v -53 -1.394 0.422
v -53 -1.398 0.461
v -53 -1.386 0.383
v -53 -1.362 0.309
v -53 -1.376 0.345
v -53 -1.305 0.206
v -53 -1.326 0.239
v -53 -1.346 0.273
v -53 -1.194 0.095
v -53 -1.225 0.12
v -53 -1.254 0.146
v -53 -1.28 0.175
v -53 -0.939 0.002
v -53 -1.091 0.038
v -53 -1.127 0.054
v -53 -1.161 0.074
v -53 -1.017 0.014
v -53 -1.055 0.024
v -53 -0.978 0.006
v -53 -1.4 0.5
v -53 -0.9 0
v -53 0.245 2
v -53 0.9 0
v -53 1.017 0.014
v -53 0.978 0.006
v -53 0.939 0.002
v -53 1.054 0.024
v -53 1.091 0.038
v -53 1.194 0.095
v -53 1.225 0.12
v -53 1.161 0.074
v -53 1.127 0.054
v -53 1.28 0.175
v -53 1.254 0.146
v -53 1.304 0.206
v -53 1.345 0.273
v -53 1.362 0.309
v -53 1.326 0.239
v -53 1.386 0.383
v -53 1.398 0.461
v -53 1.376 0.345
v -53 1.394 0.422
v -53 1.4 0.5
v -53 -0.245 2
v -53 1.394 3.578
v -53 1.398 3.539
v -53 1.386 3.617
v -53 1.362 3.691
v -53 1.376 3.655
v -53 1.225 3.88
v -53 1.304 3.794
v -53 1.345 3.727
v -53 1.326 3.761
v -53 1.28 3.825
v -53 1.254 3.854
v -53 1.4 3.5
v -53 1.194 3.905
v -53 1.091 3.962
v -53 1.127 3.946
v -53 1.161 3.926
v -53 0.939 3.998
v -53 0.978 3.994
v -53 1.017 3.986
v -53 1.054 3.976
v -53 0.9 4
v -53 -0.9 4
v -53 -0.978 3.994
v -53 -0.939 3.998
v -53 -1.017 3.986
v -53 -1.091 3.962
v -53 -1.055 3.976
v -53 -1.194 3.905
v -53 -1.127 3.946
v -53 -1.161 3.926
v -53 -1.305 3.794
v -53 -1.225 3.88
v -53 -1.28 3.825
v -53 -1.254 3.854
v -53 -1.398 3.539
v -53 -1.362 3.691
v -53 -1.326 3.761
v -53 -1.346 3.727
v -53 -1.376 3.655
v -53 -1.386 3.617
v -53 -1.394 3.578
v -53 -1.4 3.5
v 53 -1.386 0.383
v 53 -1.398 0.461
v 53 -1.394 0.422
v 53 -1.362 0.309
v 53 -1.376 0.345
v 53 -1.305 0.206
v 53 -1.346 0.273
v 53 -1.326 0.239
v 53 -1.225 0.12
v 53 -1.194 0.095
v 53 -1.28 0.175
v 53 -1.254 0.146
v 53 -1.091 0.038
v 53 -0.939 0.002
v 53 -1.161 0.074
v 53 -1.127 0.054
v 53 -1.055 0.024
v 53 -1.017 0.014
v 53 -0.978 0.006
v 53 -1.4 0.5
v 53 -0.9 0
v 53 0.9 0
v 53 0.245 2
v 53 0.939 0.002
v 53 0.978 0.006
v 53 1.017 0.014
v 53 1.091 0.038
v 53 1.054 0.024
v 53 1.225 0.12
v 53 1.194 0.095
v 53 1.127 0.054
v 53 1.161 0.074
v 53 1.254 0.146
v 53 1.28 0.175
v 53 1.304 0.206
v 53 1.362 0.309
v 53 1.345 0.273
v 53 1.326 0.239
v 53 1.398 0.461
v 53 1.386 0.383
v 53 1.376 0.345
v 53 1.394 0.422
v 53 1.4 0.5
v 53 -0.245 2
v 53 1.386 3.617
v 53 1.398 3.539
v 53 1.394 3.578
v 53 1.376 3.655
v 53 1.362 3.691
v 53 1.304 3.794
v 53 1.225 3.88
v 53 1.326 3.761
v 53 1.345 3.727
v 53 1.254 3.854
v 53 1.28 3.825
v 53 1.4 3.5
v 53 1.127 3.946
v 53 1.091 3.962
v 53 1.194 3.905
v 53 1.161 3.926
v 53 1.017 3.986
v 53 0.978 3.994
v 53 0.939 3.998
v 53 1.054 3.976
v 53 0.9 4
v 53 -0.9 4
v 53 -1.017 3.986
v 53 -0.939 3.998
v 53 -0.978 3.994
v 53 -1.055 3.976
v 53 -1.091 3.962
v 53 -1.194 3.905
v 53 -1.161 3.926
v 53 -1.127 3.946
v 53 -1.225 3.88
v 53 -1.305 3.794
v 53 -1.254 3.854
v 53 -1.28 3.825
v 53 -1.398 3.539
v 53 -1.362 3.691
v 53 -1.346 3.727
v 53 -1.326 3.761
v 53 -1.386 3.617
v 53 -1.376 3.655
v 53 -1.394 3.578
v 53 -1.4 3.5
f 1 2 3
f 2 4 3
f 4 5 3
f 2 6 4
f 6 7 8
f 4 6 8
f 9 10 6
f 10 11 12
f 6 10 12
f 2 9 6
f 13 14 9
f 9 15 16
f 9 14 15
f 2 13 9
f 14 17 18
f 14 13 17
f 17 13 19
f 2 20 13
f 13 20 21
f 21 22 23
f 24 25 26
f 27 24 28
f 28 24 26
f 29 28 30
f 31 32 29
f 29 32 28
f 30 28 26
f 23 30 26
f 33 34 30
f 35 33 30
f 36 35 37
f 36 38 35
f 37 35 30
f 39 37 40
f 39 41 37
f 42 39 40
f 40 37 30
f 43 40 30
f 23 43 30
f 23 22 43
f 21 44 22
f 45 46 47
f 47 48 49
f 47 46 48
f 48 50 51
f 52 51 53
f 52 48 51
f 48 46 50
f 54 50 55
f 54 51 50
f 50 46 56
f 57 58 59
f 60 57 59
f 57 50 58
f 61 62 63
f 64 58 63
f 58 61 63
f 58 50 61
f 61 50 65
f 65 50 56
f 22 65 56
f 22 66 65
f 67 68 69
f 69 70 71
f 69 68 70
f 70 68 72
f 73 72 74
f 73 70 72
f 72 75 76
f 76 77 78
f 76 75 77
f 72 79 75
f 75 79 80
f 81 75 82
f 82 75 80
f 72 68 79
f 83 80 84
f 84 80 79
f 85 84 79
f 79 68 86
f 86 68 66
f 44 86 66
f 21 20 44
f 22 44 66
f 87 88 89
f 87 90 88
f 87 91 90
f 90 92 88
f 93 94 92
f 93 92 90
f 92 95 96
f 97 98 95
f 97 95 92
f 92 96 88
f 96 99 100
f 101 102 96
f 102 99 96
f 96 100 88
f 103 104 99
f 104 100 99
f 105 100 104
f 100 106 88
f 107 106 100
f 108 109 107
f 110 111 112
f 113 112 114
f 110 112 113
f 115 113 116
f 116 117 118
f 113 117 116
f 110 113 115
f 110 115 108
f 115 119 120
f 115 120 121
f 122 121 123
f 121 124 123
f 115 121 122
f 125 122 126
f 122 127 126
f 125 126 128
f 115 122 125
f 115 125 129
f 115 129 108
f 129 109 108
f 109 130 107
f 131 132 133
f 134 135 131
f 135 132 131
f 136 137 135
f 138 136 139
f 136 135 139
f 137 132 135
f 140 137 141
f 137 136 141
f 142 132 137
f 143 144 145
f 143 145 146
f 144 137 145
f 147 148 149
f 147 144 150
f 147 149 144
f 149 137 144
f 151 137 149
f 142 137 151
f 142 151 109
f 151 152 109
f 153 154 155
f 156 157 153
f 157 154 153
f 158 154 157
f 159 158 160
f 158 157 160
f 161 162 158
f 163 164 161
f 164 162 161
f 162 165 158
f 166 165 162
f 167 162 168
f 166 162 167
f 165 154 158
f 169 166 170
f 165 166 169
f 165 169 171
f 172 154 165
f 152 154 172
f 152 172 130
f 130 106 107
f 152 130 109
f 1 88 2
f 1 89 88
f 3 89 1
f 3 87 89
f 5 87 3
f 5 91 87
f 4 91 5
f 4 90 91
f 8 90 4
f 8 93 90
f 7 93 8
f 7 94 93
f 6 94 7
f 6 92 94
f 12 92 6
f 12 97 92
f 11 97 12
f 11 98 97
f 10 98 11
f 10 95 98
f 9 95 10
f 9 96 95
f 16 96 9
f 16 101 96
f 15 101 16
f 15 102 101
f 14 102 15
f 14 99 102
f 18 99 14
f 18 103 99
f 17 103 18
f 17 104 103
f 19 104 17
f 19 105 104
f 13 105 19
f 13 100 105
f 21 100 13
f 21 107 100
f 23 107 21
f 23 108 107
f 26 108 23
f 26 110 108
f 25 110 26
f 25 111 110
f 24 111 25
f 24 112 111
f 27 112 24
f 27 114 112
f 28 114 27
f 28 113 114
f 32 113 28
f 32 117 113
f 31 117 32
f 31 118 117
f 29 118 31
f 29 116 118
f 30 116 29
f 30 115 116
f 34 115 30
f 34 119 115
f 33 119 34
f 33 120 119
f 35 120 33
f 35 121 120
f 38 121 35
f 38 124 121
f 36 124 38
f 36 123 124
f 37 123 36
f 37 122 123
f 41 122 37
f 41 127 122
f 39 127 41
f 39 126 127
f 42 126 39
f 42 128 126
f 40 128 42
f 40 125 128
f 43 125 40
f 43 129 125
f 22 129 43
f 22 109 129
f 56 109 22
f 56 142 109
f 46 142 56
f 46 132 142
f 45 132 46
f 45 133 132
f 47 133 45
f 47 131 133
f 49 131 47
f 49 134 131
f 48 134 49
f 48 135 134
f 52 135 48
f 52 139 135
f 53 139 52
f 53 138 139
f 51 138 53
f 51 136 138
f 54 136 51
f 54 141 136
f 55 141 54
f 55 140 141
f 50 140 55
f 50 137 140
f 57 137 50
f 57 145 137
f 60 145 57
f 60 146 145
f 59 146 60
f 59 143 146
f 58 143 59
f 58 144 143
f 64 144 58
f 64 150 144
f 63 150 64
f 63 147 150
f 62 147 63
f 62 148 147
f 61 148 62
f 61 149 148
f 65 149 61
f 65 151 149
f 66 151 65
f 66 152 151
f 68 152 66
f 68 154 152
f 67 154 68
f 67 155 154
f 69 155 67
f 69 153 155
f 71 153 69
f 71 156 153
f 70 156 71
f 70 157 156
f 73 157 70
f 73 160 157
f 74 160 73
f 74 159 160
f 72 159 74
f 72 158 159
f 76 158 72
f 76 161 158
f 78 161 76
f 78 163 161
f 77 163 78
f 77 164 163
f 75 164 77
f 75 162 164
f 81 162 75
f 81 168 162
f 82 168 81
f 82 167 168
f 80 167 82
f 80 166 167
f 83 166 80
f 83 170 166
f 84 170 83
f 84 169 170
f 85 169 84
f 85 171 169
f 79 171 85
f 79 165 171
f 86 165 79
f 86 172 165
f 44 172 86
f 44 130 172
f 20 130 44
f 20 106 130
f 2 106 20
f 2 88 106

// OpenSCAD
include <../parameters.scad>
use <../lib/slider.scad>

module steering_rack_anti_tilt_key() {
  translate([-steering_panel_rail_len / 2,
             steering_rack_width / 2
             - steering_rack_anti_tilt_key_thickness
             - steering_rack_anti_tilt_rack_x_offset,
             0]) {
    cube([steering_panel_rail_len,
          steering_rack_anti_tilt_key_thickness,
          steering_rack_anti_tilt_key_height], center=false);
  }
}

module steering_rail(h=steering_panel_rail_height,
                     w=steering_panel_rail_thickness,
                     l=steering_panel_rail_len,
                     angle=steering_panel_rail_angle,
                     r=steering_panel_rail_rad) {
  translate([0, -w / 2, 0]) {
    rotate([90, 0, 90]) {
      linear_extrude(height=l,
                     center=true) {
        dovetail_rib(w=w,
                     h=h,
                     angle=angle,
                     r=r,
                     center=false);
      }
    }
  }
}

module steering_rail_relief_cutter(h=steering_panel_rail_height,
                                   w=steering_panel_rail_thickness
                                   + steering_rack_rail_tolerance,
                                   l=steering_panel_rail_len,
                                   angle=steering_panel_rail_angle,
                                   r=steering_panel_rail_rad,
                                   edge_land=steering_rail_edge_land,
                                   relief_depth=steering_rail_relief_depth) {
  d_parallel = relief_depth / cos(angle);
  translate([0, 0, h / 2]) {
    rotate([90, 0, 90]) {
      linear_extrude(height=l,
                     center=true,
                     convexity=2) {
        intersection() {
          offset(r=d_parallel) {
            dovetail_rib(w=w, h=h, angle=angle, r=r, center=true);
          }

          offset(r=-edge_land) {
            offset(r = edge_land) {
              dovetail_rib(w=w, h=h, angle=angle, r=r, center=true);
            }
          }
        }
      }
    }
  }
}

union() {
  // translate([0, 0, 0]) {
  //   color("green", alpha=1) {
  //     steering_rail();
  //   }
  // }
  steering_rail();
  // color("red", alpha=1) {
  //   steering_rail_relief_cutter();
  // }
}
// steering_rail();
